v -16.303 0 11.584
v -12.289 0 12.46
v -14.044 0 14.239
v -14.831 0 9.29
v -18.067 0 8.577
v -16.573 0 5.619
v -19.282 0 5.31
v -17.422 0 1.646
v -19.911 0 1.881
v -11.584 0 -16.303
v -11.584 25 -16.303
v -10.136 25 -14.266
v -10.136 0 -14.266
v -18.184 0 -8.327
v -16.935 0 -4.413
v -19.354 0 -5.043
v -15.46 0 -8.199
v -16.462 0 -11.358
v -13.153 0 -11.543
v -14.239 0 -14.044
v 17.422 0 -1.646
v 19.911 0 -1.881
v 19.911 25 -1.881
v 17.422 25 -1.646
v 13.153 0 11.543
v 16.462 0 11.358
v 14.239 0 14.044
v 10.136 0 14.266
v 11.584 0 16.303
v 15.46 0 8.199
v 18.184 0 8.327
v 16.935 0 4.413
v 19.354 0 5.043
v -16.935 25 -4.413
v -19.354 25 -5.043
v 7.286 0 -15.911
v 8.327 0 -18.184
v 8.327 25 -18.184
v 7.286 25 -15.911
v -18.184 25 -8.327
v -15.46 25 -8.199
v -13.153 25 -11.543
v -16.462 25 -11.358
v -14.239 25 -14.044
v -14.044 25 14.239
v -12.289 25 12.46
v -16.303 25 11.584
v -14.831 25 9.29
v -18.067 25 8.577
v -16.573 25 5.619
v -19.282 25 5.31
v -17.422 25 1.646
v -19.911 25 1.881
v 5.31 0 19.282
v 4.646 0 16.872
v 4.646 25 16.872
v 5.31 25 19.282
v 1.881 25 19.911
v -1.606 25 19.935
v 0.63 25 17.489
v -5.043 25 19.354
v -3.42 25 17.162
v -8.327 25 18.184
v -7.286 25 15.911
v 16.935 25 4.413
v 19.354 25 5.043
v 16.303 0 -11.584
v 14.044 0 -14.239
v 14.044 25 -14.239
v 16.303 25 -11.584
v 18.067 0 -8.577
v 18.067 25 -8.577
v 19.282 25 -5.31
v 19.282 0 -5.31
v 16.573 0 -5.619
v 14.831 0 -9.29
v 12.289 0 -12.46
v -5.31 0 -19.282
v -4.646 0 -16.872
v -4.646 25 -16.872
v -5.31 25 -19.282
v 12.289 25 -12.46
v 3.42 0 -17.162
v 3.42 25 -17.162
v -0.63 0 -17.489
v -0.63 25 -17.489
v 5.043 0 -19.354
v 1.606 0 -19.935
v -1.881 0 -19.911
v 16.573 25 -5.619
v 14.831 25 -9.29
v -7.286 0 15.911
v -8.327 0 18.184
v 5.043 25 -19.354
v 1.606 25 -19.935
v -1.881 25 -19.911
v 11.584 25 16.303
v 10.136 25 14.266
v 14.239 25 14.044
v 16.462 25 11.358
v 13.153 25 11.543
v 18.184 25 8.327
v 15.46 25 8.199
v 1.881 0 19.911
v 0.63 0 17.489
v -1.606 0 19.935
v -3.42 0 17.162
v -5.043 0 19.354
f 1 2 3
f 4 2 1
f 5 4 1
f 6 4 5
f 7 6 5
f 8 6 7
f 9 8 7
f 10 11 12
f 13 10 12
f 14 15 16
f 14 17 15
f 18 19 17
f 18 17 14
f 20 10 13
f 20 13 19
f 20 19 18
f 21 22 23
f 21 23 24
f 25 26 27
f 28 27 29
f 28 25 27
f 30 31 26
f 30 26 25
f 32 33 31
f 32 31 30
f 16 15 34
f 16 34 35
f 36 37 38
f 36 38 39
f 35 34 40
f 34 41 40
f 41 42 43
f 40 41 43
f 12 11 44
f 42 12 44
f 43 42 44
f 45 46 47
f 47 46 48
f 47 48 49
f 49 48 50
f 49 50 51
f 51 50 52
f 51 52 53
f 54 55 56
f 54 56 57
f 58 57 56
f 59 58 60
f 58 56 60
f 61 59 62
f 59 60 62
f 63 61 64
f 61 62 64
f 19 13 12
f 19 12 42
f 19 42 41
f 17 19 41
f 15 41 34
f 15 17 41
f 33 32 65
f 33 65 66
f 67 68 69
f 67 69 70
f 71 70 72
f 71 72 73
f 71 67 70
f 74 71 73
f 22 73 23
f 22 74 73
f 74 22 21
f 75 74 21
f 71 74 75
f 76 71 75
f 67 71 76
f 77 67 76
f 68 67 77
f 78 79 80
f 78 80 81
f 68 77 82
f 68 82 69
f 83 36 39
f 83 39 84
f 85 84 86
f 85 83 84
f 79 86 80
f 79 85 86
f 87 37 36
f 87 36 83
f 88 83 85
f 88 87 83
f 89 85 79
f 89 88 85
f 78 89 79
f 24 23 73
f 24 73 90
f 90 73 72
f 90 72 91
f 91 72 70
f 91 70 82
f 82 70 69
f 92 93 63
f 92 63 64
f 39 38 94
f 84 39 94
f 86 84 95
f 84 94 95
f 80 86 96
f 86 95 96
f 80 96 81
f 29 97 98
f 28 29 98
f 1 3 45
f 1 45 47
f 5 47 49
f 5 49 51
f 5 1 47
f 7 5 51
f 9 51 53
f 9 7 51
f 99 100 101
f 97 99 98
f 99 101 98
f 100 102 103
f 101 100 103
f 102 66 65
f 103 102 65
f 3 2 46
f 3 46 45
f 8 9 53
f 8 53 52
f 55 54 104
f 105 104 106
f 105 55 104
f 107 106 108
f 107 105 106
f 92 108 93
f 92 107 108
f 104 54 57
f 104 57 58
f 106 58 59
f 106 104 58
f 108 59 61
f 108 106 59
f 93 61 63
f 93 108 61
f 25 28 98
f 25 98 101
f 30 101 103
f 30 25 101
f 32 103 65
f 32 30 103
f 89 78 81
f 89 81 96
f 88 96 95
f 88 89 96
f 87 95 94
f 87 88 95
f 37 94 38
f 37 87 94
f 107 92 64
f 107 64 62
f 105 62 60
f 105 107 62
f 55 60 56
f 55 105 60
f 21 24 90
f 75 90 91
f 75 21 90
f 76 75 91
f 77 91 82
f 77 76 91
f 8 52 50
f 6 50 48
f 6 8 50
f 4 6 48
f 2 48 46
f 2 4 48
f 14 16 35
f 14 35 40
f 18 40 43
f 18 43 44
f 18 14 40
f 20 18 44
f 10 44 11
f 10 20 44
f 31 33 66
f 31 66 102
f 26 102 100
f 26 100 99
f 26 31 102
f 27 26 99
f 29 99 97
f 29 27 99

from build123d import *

# Parameters (mm, degrees)
BOSS_EXTRUDE2_DEPTH   = 25
BOSS_EXTRUDE2_2_DEPTH = 25
BOSS_EXTRUDE2_3_DEPTH = 25
BOSS_EXTRUDE2_4_DEPTH = 25
BOSS_EXTRUDE2_5_DEPTH = 25
BOSS_EXTRUDE2_6_DEPTH = 25
SKETCH7_R             = 17.5
CUT_EXTRUDE1_DEPTH    = 25


with BuildPart() as part:
    # Sketch6 → Boss-Extrude2 (new body)
    with BuildSketch(Plane(origin=(0, 0, 0), x_dir=(1, 0, 0), z_dir=(0, 1, 0))):
        with BuildLine():
            ThreePointArc((-19.353791735, 5.042890586), (-16.461845117, 11.358153694), (-11.584357027, 16.303455839))
            Line((-11.584357027, 16.303455839), (0, 0))
            Line((0, 0), (-19.353791735, 5.042890586))
        make_face()
    extrude(amount=BOSS_EXTRUDE2_DEPTH)


with BuildPart() as body_2:
    # Sketch6 → Boss-Extrude2 2 (new body)
    with BuildSketch(Plane(origin=(0, 0, 0), x_dir=(1, 0, 0), z_dir=(0, 1, 0))):
        with BuildLine():
            ThreePointArc((-14.044167224, -14.239430009), (-18.067372198, -8.577299217), (-19.911385439, -1.880619552))
            Line((-19.911385439, -1.880619552), (0, 0))
            Line((0, 0), (-14.044167224, -14.239430009))
        make_face()
    extrude(amount=BOSS_EXTRUDE2_2_DEPTH)


with BuildPart() as body_3:
    # Sketch6 → Boss-Extrude2 3 (new body)
    with BuildSketch(Plane(origin=(0, 0, 0), x_dir=(1, 0, 0), z_dir=(0, 1, 0))):
        with BuildLine():
            ThreePointArc((5.309624512, -19.282320595), (-1.605527081, -19.935452912), (-8.327028412, -18.184075391))
            Line((-8.327028412, -18.184075391), (0, 0))
            Line((0, 0), (5.309624512, -19.282320595))
        make_face()
    extrude(amount=BOSS_EXTRUDE2_3_DEPTH)


with BuildPart() as body_4:
    # Sketch6 → Boss-Extrude2 4 (new body)
    with BuildSketch(Plane(origin=(0, 0, 0), x_dir=(1, 0, 0), z_dir=(0, 1, 0))):
        with BuildLine():
            ThreePointArc((19.353791735, -5.042890586), (16.461845117, -11.358153694), (11.584357027, -16.303455839))
            Line((11.584357027, -16.303455839), (0, 0))
            Line((0, 0), (19.353791735, -5.042890586))
        make_face()
    extrude(amount=BOSS_EXTRUDE2_4_DEPTH)


with BuildPart() as body_5:
    # Sketch6 → Boss-Extrude2 5 (new body)
    with BuildSketch(Plane(origin=(0, 0, 0), x_dir=(1, 0, 0), z_dir=(0, 1, 0))):
        with BuildLine():
            ThreePointArc((14.044167224, 14.239430009), (18.067372198, 8.577299217), (19.911385439, 1.880619552))
            Line((19.911385439, 1.880619552), (0, 0))
            Line((0, 0), (14.044167224, 14.239430009))
        make_face()
    extrude(amount=BOSS_EXTRUDE2_5_DEPTH)


with BuildPart() as body_6:
    # Sketch6 → Boss-Extrude2 6 (new body)
    with BuildSketch(Plane(origin=(0, 0, 0), x_dir=(1, 0, 0), z_dir=(0, 1, 0))):
        with BuildLine():
            ThreePointArc((-5.309624512, 19.282320595), (1.605527081, 19.935452912), (8.327028412, 18.184075391))
            Line((8.327028412, 18.184075391), (0, 0))
            Line((0, 0), (-5.309624512, 19.282320595))
        make_face()
    extrude(amount=BOSS_EXTRUDE2_6_DEPTH)


with BuildPart() as cut_extrude1_tool:
    # Sketch7 → Cut-Extrude1 (new body)
    with BuildSketch(Plane(origin=(0, 0, 0), x_dir=(1, 0, 0), z_dir=(0, 1, 0))):
        Circle(SKETCH7_R)
    extrude(amount=CUT_EXTRUDE1_DEPTH)


with BuildPart() as part_1:
    add(part.part)

    # Cut-Extrude1: cut by cut_extrude1_tool
    add(cut_extrude1_tool.part, mode=Mode.SUBTRACT)


with BuildPart() as body_2_1:
    add(body_2.part)

    # Cut-Extrude1: cut by cut_extrude1_tool
    add(cut_extrude1_tool.part, mode=Mode.SUBTRACT)


with BuildPart() as body_3_1:
    add(body_3.part)

    # Cut-Extrude1: cut by cut_extrude1_tool
    add(cut_extrude1_tool.part, mode=Mode.SUBTRACT)


with BuildPart() as body_4_1:
    add(body_4.part)

    # Cut-Extrude1: cut by cut_extrude1_tool
    add(cut_extrude1_tool.part, mode=Mode.SUBTRACT)


with BuildPart() as body_5_1:
    add(body_5.part)

    # Cut-Extrude1: cut by cut_extrude1_tool
    add(cut_extrude1_tool.part, mode=Mode.SUBTRACT)


with BuildPart() as body_6_1:
    add(body_6.part)

    # Cut-Extrude1: cut by cut_extrude1_tool
    add(cut_extrude1_tool.part, mode=Mode.SUBTRACT)


solid = Compound([part_1.part, body_2_1.part, body_3_1.part, body_4_1.part, body_5_1.part, body_6_1.part])
